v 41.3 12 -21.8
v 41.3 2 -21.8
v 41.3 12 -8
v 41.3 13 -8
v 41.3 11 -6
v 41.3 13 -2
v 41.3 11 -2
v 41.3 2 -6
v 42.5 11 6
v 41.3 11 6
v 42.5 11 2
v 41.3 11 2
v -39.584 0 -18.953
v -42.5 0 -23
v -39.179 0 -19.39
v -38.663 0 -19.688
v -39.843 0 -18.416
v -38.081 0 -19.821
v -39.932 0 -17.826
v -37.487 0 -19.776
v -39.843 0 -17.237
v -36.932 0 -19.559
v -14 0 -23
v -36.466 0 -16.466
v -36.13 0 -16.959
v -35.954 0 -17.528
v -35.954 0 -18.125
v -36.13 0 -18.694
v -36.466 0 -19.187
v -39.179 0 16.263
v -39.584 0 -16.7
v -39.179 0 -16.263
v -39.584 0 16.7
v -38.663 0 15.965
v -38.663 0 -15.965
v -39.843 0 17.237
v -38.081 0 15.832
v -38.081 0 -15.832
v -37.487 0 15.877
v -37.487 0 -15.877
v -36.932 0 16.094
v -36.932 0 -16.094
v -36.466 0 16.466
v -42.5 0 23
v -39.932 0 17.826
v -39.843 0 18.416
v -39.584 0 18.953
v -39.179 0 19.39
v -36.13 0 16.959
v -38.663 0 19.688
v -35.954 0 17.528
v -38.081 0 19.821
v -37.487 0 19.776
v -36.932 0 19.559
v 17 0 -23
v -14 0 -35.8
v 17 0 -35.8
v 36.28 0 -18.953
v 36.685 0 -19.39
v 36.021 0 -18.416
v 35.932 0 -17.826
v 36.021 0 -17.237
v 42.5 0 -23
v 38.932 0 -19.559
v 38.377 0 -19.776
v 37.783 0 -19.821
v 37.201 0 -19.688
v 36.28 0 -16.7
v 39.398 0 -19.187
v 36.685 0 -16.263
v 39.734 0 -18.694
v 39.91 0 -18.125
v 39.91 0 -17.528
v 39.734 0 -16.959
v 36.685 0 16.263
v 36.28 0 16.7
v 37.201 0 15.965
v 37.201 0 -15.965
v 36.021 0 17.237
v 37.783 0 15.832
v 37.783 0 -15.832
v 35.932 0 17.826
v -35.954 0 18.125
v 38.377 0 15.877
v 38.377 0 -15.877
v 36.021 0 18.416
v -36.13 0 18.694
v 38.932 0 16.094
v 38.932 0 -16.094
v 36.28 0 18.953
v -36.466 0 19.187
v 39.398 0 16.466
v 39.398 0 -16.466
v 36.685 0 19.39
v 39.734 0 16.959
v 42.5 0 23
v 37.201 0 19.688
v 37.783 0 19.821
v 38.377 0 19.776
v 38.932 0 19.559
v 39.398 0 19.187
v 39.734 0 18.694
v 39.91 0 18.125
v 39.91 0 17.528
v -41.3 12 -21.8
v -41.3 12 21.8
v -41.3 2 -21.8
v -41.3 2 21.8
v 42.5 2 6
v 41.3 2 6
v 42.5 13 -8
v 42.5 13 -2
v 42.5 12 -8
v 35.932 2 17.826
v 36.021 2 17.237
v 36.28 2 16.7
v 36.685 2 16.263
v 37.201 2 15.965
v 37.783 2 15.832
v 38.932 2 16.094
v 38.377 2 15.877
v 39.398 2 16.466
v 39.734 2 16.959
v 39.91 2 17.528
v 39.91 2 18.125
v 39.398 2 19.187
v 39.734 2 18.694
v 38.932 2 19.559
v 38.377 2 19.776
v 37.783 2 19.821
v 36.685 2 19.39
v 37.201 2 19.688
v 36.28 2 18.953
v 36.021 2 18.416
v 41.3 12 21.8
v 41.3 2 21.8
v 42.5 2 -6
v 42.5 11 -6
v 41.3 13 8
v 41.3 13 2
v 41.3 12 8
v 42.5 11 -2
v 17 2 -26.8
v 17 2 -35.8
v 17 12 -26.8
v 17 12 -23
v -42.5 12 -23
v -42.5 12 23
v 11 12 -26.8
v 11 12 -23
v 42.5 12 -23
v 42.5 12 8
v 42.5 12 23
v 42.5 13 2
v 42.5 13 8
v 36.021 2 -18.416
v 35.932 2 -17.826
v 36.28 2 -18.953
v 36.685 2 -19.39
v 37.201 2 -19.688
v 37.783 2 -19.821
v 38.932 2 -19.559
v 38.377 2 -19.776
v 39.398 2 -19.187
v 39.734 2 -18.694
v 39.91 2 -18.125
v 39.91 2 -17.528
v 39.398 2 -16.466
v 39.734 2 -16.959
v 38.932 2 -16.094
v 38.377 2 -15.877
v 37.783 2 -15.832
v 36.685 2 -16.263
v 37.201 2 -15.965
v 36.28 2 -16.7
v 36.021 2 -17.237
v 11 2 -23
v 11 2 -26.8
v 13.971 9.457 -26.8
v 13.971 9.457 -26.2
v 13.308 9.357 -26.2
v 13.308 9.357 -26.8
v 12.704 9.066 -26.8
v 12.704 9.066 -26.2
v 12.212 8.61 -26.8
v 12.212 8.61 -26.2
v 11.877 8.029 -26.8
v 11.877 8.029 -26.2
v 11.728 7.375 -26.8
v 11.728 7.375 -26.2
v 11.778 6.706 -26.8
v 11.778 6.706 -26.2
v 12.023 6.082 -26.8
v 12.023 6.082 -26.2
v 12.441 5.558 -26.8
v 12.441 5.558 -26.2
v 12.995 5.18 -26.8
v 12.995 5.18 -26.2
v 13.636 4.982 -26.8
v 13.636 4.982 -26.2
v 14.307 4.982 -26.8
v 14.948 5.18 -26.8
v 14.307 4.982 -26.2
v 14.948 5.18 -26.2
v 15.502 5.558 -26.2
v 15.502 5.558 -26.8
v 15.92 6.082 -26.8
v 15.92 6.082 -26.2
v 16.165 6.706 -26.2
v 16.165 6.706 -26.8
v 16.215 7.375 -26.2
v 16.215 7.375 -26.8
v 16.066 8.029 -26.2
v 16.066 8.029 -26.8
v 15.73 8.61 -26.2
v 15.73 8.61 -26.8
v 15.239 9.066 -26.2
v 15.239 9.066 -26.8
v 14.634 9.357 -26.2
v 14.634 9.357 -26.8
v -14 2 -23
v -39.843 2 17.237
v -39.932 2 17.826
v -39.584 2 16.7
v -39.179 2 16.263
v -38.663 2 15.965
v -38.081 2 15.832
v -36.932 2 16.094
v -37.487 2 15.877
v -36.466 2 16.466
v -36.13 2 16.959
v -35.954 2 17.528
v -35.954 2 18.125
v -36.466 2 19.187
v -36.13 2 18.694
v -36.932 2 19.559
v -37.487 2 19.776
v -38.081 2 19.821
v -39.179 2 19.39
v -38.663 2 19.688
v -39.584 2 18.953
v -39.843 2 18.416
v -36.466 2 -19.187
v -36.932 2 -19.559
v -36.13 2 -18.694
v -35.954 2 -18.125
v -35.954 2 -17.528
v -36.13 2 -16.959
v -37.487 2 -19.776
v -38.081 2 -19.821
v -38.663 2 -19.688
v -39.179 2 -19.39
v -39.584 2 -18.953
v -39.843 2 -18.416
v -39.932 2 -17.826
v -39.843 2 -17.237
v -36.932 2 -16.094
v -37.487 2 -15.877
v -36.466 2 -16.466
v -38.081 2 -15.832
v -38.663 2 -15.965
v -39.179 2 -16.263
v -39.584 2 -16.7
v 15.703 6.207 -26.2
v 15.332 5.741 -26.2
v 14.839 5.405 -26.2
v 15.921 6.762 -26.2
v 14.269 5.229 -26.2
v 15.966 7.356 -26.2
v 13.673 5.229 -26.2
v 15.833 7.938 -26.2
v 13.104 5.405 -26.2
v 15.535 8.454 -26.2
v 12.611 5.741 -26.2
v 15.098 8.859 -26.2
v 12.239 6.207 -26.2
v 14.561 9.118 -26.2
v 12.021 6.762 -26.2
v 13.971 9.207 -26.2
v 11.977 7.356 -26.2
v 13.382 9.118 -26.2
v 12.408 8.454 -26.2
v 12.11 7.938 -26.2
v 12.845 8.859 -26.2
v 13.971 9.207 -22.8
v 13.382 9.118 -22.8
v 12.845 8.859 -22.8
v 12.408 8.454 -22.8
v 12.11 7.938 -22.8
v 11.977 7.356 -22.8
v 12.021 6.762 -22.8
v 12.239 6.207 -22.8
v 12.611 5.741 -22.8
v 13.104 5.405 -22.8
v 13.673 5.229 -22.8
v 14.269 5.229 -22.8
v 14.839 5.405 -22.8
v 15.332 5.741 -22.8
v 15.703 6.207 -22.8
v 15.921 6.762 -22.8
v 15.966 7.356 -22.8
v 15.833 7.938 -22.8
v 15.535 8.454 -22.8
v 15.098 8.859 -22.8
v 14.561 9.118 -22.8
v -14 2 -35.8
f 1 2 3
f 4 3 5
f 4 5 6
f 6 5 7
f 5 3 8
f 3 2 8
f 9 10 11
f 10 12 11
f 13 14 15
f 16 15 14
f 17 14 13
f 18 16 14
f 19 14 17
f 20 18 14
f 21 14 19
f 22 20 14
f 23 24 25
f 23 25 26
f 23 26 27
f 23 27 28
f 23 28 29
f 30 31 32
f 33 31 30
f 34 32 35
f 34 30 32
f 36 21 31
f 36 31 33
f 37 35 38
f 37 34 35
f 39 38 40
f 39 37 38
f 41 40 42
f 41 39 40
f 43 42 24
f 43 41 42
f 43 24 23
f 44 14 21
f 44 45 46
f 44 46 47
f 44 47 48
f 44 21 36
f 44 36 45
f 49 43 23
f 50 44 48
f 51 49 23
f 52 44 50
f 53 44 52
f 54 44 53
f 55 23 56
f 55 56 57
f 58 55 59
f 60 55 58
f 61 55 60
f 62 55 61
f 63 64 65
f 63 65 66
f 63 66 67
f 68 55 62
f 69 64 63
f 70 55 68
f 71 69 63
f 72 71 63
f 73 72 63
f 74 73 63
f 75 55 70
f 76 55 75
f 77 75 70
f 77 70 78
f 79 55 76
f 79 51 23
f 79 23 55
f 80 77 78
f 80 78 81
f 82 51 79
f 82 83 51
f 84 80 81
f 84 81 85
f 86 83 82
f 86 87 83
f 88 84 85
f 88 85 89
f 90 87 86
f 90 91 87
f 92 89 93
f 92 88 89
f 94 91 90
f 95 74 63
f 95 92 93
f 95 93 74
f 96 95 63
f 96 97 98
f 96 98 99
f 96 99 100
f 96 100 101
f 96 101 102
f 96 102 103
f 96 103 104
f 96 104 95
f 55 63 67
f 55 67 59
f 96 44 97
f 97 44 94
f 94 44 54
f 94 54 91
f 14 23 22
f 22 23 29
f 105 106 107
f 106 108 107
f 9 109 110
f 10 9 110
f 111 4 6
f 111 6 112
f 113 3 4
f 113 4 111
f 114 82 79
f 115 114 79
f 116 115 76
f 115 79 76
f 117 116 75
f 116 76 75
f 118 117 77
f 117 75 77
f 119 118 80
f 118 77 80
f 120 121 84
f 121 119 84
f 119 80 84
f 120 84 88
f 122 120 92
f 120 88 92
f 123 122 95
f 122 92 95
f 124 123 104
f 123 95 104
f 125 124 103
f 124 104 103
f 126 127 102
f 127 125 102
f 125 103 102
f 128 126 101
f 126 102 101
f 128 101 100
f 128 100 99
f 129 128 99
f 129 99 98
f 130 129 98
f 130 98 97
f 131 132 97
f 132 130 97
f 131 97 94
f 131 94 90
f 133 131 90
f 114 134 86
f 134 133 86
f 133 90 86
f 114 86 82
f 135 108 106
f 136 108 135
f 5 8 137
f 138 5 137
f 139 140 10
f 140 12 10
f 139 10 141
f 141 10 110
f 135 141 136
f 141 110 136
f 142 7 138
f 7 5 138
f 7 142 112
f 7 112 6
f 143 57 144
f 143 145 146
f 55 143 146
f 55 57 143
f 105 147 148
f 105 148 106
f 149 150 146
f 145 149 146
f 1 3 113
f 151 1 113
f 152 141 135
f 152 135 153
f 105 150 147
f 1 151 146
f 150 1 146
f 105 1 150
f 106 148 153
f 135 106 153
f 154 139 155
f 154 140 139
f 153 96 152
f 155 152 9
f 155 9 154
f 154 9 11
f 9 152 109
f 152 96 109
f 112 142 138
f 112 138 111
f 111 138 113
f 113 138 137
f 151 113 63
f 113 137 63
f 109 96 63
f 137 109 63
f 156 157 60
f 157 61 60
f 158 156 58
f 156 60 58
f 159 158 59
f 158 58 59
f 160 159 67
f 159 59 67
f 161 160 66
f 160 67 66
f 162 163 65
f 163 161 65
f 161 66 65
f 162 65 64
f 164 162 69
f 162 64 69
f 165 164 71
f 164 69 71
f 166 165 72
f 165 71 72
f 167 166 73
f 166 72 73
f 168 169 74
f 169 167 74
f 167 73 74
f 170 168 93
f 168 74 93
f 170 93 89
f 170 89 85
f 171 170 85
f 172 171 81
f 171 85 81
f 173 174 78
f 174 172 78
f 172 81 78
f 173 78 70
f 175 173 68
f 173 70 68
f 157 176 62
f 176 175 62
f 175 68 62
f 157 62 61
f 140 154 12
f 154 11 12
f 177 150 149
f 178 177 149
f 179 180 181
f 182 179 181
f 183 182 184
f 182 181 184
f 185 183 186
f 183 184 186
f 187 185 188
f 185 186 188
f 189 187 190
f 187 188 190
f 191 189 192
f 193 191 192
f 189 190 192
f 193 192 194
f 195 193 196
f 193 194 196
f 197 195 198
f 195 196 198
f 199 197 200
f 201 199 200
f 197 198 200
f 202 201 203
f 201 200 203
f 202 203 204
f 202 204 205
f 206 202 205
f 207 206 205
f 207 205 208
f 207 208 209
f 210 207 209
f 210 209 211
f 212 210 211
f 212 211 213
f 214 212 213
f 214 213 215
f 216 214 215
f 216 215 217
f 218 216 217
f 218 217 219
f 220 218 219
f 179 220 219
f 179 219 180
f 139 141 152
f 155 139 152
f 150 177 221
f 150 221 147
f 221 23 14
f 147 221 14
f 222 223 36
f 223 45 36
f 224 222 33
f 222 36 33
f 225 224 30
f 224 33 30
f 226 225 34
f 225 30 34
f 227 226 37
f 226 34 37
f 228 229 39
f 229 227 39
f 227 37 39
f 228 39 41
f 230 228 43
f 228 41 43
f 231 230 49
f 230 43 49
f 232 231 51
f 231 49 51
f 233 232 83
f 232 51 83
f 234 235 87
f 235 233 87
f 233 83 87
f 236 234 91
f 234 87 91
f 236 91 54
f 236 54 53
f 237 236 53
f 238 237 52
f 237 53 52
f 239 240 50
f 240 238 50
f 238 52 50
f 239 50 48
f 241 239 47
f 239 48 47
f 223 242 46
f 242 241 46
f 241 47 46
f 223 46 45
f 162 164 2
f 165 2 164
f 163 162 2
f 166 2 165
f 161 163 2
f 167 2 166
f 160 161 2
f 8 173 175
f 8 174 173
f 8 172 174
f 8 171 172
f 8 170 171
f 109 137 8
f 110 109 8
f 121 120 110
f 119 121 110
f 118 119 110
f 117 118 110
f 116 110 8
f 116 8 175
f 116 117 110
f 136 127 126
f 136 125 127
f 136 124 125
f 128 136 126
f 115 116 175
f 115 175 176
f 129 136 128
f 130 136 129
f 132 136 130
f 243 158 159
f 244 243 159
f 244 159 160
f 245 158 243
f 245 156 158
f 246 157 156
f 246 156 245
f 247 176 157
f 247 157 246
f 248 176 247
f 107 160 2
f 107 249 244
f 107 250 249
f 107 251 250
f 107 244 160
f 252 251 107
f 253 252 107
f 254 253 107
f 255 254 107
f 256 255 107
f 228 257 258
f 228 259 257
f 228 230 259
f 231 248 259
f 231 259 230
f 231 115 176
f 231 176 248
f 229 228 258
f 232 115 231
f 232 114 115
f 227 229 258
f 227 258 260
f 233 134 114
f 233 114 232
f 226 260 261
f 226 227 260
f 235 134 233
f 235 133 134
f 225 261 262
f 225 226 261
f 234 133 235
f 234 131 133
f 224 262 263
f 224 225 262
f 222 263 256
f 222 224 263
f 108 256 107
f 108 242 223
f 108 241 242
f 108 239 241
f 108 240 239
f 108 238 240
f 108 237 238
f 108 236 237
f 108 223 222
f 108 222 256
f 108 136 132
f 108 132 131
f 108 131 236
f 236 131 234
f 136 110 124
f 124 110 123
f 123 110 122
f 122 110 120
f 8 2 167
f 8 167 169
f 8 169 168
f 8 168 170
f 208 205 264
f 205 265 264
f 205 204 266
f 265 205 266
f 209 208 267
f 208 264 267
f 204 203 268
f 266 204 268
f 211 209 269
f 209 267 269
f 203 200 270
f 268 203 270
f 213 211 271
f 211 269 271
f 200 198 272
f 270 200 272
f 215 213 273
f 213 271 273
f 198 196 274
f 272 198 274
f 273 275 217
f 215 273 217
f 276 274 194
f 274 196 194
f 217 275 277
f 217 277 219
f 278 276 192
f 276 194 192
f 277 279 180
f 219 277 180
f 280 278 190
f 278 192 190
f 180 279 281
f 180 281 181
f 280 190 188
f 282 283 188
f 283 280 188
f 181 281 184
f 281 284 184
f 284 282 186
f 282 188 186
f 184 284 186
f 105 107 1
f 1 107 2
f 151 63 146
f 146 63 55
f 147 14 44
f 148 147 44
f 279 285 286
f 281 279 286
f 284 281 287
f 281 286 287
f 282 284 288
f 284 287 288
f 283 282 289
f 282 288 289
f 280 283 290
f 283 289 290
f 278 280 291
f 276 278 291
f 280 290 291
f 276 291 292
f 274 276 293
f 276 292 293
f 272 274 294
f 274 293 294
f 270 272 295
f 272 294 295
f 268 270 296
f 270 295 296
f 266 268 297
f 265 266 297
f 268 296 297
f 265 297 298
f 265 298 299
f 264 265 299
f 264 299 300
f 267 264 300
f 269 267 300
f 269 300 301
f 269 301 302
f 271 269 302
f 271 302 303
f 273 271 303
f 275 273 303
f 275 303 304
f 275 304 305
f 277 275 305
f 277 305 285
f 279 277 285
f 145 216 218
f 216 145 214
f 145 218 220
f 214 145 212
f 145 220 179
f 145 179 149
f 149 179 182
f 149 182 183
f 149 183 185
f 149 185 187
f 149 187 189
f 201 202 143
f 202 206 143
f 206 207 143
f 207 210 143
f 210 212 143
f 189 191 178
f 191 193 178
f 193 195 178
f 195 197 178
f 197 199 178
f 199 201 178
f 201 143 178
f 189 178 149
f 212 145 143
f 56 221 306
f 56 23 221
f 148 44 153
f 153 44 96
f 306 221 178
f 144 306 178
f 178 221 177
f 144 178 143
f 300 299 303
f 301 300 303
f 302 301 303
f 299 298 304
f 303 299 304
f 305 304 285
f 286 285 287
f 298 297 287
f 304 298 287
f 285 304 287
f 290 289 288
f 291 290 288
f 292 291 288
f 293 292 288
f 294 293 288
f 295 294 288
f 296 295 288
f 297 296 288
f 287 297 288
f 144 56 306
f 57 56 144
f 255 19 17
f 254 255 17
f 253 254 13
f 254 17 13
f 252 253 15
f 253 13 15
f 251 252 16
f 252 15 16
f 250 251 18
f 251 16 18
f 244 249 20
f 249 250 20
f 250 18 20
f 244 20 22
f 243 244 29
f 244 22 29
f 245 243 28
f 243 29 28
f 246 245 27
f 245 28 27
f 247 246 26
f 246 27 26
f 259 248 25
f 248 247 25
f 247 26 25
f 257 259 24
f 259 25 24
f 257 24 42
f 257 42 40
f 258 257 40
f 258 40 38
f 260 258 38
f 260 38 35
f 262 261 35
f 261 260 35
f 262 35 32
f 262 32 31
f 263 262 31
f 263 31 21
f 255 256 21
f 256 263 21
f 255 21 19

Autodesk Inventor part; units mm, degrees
ref_plane "YZ Plane" through (0, 0, 0) normal (1, 0, 0) x (0, 1, 0)
ref_plane "XZ Plane" through (0, 0, 0) normal (0, 1, 0) x (-1, 0, 0)
ref_plane "XY Plane" through (0, 0, 0) normal (0, 0, 1) x (1, 0, 0)
sketch "Szkic2" plane through (0, 0, 0) normal (0, 1, 0) x (-1, 0, 0)
  line L0 (42.5, 23) -> (-42.5, 23)
  line L1 (-42.5, 23) -> (-42.5, -23)
  line L2 (-42.5, -23) -> (42.5, -23)
  line L3 (42.5, -23) -> (42.5, 23)
  line L4 (0, 91.0722) -> (0, -100.1143)
  line L5 (-78.4738, 0) -> (170.7955, 0)
  circle A0 centre (37.932, 17.8265) radius 2
  circle A1 centre (37.932, -17.8265) radius 2
  circle A2 centre (-37.932, 17.8265) radius 2
  circle A3 centre (-37.932, -17.8265) radius 2
  point P0 (0, 0)
  dimension "d7" = 46
  dimension "d8" = 85
  dimension "d14" = 4
  dimension "d16" = 35.653
  dimension "d18" = 23
  dimension "d21" = 75.864
  dimension "d22" = 42.5
extrude "Wyciągnięcie proste2" add sketch "Szkic2" along normal blind 2
sketch "Szkic3" plane through (0, 2, 0) normal (0, 1, 0) x (1, 0, 0)
  line L0 (-42.5, -23) -> (42.5, -23) projected
  line L1 (42.5, -23) -> (42.5, 23) projected
  line L2 (41.3, -23) -> (42.5, -23)
  line L3 (42.5, -23) -> (42.5, 23)
  line L4 (42.5, 23) -> (41.3, 23)
  line L5 (41.3, 23) -> (41.3, -23)
  line L6 (-42.5, 23) -> (-42.5, -23) projected
  line L7 (42.5, -23) -> (-42.5, -23)
  line L8 (-42.5, -23) -> (-42.5, -21.8)
  line L9 (-42.5, -21.8) -> (42.5, -21.8)
  line L10 (42.5, -21.8) -> (42.5, -23)
  line L11 (42.5, 23) -> (-42.5, 23)
  line L12 (-42.5, 23) -> (-42.5, 21.8)
  line L13 (-42.5, 21.8) -> (42.5, 21.8)
  line L14 (42.5, 21.8) -> (42.5, 23)
  line L15 (42.5, 23) -> (-42.5, 23) projected
  line L16 (-42.5, -23) -> (-41.3, -23)
  line L17 (-41.3, -23) -> (-41.3, 23)
  line L18 (-41.3, 23) -> (-42.5, 23)
  line L19 (-42.5, 23) -> (-42.5, -23)
  line L20 (42.5, -6) -> (41.3, -6)
  line L21 (41.3, -6) -> (41.3, 6)
  line L22 (41.3, 6) -> (42.5, 6)
  line L23 (36.3786, 0) -> (45.7918, 0)
  point P0 (0, 0)
  point P1 (41.3, -21.8)
  point P2 (-41.3, -21.8)
  point P3 (-41.3, 21.8)
  point P4 (41.3, 21.8)
  dimension "d25" = 1.2
  dimension "d26" = 1.2
  dimension "d27" = 1.2
  dimension "d28" = 1.2
  dimension "d29" = 12
  dimension "d30" = 6
extrude "Wyciągnięcie proste3" add sketch "Szkic3" along normal blind 10 contours L6 L9 L17 L0 | L17 L9 L5 L0 | L6 L13 L17 L9 | L5 L9 L1 L0 | L6 L11 L17 L13 | L5 L20 L1 L9 | L17 L11 L5 L13 | L13 L1 L22 L5 | L5 L4 L1 L13
sketch "Szkic5" plane through (0, 12, 0) normal (0, 1, 0) x (1, 0, 0)
  line L0 (41.3, -6) -> (41.3, -21.8) projected
  line L1 (42.5, -6) -> (42.5, 6) projected
  line L2 (41.3, -8) -> (42.5, -8)
  line L3 (42.5, -8) -> (42.5, -2)
  line L4 (42.5, -2) -> (41.3, -2)
  line L5 (41.3, -2) -> (41.3, -8)
  line L6 (34.6755, 0) -> (49.4443, 0)
  line L7 (40.0187, -6) -> (43.7777, -6)
  line L8 (41.3, 8) -> (42.5, 8)
  line L9 (42.5, 8) -> (42.5, 2)
  line L10 (42.5, 2) -> (41.3, 2)
  line L11 (41.3, 2) -> (41.3, 8)
  line L12 (40.0187, 6) -> (43.7777, 6)
  point P0 (0, 0)
  point P1 (41.3, 6)
  dimension "d33" = 6
  dimension "d34" = 2
extrude "Wyciągnięcie proste4" add sketch "Szkic5" along normal blind 1 contours L7 L3 L2 L0 | L12 L11 L8 L9
extrude "Wyciągnięcie proste5" add sketch "Szkic5" along normal mid plane 2 contours L10 L11 L12 L1 | L5 L4 L1 L7
sketch "Szkic6" plane through (42.5, 0, -23) normal (0, 0, -1) x (-1, 0, 0)
  line L0 (83.8, 12) -> (1.2, 12) projected
  line L1 (26, 12) -> (26, 0)
  line L2 (31.5, 12) -> (31.5, 0)
  line L3 (53.5, 12) -> (53.5, 0)
  line L4 (0, 0) -> (85, 0) projected
  line L5 (56.5, 12) -> (56.5, 0)
  line L6 (0, 0) -> (0, 12) projected
  circle A0 centre (28.6456, 7.207) radius 1.5875
  line L7 (1.2, 2) -> (83.8, 2) projected
  line L8 (26, 2) -> (56.5, 2)
  point P0 (42.5, 0)
  dimension "d39" = 5.5
  dimension "d40" = 22
  dimension "d41" = 3
  dimension "d42" = 31.5
  dimension "d43" = 3.175
  dimension "d55" = 5.207
sketch "Szkic8" plane through (0, 0, 0) normal (0, -1, 0) x (1, 0, 0)
  line L0 (42.5, -23) -> (-42.5, -23) projected
  line L1 (20.6822, -23) -> (-15.9857, -23)
  line L2 (-15.9857, -23) -> (-15.9857, -42.1071)
  line L3 (-15.9857, -42.1071) -> (20.6822, -42.1071)
  line L4 (20.6822, -42.1071) -> (20.6822, -23)
  line L5 (17, -23) -> (11, -23)
  line L6 (11, -23) -> (11, -35.8)
  line L7 (11, -35.8) -> (17, -35.8)
  line L8 (17, -35.8) -> (17, -23)
  line L9 (11, -23) -> (-11, -23)
  line L10 (-11, -23) -> (-11, -35.8)
  line L11 (-11, -35.8) -> (11, -35.8)
  line L12 (11, -35.8) -> (11, -23)
  line L13 (-11, -23) -> (-14, -23)
  line L14 (-14, -23) -> (-14, -35.8)
  line L15 (-14, -35.8) -> (-11, -35.8)
  line L16 (-11, -35.8) -> (-11, -23)
  line L17 (17, -26.8) -> (-14, -26.8)
  point P0 (0, 0)
  point P1 (11, -26.8)
  point P2 (-14, -23)
  point P3 (17, -23)
  dimension "d45" = 6
  dimension "d46" = 22
  dimension "d47" = 3
  dimension "d48" = 31.5
  dimension "d49" = 3.8
  dimension "d50" = 9
extrude "Wyciągnięcie proste6" add sketch "Szkic8" against normal blind 2 contours L6 L17 L10 L0 | L8 L7 L6 L17 | L10 L17 L14 L0 | L6 L11 L10 L17 | L10 L15 L14 L17
extrude "Wyciągnięcie proste7" add sketch "Szkic8" against normal blind 12 contours L8 L17 L6 L0
sketch "Szkic9" plane through (17, 2, -26.8) normal (0, 0, -1) x (-1, 0, 0)
  circle A0 centre (3.0287, 5.207) radius 1.4322
  line L0 (0, 0) -> (31, 0) projected
  point P0 (17, -2)
  dimension "d63" = 5.207
hole "Otwór2" at (13.9713, 7.207, -26.8) direction (0, 0, 1) diameter 4 depth 4 counterbore diameter 4.5 counterbore depth 0.6
properties part number "prent1"
